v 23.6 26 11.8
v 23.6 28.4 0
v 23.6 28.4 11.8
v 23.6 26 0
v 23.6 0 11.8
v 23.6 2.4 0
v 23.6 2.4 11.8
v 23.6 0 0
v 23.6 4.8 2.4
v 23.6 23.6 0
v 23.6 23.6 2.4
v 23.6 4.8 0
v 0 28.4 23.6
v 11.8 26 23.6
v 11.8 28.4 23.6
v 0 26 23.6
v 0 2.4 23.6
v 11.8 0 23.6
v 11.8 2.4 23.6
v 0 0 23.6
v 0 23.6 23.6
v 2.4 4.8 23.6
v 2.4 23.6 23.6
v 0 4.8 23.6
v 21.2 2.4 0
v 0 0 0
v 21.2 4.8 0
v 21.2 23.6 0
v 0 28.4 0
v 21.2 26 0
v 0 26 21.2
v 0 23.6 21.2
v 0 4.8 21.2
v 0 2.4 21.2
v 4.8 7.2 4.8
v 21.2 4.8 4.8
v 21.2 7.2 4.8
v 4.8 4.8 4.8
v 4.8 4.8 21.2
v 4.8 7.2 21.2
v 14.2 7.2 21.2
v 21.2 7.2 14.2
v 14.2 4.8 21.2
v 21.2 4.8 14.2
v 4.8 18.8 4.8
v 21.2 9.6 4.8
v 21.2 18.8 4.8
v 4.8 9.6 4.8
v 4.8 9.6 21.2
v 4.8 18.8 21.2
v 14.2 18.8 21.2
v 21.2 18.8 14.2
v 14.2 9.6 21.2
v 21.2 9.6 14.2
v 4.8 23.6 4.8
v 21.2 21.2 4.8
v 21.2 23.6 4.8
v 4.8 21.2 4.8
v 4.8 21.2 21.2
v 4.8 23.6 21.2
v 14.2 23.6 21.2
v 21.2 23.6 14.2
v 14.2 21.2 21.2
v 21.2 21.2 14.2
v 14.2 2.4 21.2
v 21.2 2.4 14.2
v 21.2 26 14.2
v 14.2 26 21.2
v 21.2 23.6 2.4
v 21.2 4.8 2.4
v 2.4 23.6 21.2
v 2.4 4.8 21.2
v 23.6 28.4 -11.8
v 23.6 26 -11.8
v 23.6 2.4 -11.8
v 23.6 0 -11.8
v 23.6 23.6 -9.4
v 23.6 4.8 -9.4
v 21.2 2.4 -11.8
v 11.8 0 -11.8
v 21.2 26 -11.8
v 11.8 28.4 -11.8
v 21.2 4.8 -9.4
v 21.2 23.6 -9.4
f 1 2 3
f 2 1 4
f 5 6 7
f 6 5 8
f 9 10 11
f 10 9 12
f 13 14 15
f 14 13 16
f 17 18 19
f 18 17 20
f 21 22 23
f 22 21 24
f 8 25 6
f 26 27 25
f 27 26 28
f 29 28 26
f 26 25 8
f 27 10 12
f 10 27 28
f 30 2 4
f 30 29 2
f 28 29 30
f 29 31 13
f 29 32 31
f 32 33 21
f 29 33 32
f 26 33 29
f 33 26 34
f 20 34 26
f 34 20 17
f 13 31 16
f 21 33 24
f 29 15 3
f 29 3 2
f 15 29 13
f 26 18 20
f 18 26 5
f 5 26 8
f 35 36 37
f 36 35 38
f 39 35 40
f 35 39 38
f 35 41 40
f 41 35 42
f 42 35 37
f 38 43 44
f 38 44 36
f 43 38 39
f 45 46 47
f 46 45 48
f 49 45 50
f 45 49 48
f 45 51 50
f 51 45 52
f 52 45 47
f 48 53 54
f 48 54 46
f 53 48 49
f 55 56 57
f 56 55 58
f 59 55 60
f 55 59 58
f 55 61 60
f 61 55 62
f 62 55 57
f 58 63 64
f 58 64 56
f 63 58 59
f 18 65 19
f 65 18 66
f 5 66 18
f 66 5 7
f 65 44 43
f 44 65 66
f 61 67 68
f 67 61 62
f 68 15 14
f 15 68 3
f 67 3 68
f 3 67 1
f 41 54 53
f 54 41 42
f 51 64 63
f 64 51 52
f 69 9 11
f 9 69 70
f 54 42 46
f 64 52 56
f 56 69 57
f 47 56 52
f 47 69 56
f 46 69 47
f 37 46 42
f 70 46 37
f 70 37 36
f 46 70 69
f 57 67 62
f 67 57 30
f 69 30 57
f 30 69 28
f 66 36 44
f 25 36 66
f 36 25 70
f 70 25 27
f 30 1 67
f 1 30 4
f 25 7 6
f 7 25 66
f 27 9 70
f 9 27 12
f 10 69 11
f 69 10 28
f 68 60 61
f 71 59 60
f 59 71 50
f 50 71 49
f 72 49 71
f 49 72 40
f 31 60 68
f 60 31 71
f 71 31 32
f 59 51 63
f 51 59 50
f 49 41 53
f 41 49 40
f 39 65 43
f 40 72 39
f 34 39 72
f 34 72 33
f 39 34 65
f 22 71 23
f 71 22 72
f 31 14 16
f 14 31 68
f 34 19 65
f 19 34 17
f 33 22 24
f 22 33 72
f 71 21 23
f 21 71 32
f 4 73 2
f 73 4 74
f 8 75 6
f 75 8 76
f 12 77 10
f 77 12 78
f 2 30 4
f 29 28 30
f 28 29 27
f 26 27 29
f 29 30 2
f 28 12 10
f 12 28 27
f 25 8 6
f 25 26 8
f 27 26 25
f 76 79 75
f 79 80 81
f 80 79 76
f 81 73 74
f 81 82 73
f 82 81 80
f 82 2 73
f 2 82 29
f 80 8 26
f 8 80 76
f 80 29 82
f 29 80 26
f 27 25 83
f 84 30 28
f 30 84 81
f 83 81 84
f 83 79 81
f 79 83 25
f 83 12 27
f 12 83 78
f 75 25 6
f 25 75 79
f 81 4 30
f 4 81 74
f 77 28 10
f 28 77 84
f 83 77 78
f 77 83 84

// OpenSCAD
$fn = 30;

t = 2.4;
w_airgap = 18.8;

difference() {
    cube([2*t + w_airgap, 4*t + w_airgap, 2*t + w_airgap]);

    // outer gap
    translate([2*t, 2*t, 2*t])
    cube([w_airgap, t, 2*t + w_airgap]);

    // middle gap
    translate([2*t, 4*t, 2*t])
    cube([w_airgap, w_airgap - 4*t , t + w_airgap]);

    // inner gap
    translate([2*t, t + w_airgap, 2*t])
    cube([w_airgap, t, t + w_airgap]);

    // rotated cube
    translate([0, 0, 3*t + 1.5*w_airgap])
    rotate([0, 45, 0])
    cube([2*w_airgap, 2*w_airgap, 2*w_airgap]);

    // interface cavity lower
    translate([t + w_airgap, t, t])
    cube([t, 2*t + w_airgap, (4*t + w_airgap)/2]);

    // interface cavity for lower outer teeth
    translate([t + w_airgap, t, 0])
    cube([t, t, t]);

    // interface cavity for lower inner teeth
    translate([t + w_airgap, 2*t + w_airgap, 0])
    cube([t, t, t]);

    // interface cavity upper
    translate([t, t, t + w_airgap])
    cube([(4*t + w_airgap)/2, 2*t + w_airgap, t]);

    // interface cavity for upper outer teeth
    translate([0, t, t + w_airgap])
    cube([t, t, t]);

    // interface cavity for upper inner teeth
    translate([0, 2*t + w_airgap, t + w_airgap])
    cube([t, t, t]);
}

translate([0, 0, -2*t - w_airgap])
difference() {
    translate([0, 0, t + w_airgap/2])
    cube([2*t + w_airgap, 4*t + w_airgap, t + w_airgap/2]);

    // rotated cube
    translate([0, 0, 2*t + w_airgap])
    rotate([0, 135, 0])
    cube([2*w_airgap, 2*w_airgap, 2*w_airgap]);

    // interface cavity for lower outer teeth
    translate([t + w_airgap, t, t + w_airgap/2])
    cube([t, t, t + w_airgap/2]);

    // interface cavity for lower inner teeth
    translate([t + w_airgap, 2*t + w_airgap, t + w_airgap/2])
    cube([t, t, t + w_airgap/2]);

    // interface cavity for lower inner teeth
    translate([t + w_airgap, 2*t, t + w_airgap/2])
    cube([t, w_airgap, t]);
}
